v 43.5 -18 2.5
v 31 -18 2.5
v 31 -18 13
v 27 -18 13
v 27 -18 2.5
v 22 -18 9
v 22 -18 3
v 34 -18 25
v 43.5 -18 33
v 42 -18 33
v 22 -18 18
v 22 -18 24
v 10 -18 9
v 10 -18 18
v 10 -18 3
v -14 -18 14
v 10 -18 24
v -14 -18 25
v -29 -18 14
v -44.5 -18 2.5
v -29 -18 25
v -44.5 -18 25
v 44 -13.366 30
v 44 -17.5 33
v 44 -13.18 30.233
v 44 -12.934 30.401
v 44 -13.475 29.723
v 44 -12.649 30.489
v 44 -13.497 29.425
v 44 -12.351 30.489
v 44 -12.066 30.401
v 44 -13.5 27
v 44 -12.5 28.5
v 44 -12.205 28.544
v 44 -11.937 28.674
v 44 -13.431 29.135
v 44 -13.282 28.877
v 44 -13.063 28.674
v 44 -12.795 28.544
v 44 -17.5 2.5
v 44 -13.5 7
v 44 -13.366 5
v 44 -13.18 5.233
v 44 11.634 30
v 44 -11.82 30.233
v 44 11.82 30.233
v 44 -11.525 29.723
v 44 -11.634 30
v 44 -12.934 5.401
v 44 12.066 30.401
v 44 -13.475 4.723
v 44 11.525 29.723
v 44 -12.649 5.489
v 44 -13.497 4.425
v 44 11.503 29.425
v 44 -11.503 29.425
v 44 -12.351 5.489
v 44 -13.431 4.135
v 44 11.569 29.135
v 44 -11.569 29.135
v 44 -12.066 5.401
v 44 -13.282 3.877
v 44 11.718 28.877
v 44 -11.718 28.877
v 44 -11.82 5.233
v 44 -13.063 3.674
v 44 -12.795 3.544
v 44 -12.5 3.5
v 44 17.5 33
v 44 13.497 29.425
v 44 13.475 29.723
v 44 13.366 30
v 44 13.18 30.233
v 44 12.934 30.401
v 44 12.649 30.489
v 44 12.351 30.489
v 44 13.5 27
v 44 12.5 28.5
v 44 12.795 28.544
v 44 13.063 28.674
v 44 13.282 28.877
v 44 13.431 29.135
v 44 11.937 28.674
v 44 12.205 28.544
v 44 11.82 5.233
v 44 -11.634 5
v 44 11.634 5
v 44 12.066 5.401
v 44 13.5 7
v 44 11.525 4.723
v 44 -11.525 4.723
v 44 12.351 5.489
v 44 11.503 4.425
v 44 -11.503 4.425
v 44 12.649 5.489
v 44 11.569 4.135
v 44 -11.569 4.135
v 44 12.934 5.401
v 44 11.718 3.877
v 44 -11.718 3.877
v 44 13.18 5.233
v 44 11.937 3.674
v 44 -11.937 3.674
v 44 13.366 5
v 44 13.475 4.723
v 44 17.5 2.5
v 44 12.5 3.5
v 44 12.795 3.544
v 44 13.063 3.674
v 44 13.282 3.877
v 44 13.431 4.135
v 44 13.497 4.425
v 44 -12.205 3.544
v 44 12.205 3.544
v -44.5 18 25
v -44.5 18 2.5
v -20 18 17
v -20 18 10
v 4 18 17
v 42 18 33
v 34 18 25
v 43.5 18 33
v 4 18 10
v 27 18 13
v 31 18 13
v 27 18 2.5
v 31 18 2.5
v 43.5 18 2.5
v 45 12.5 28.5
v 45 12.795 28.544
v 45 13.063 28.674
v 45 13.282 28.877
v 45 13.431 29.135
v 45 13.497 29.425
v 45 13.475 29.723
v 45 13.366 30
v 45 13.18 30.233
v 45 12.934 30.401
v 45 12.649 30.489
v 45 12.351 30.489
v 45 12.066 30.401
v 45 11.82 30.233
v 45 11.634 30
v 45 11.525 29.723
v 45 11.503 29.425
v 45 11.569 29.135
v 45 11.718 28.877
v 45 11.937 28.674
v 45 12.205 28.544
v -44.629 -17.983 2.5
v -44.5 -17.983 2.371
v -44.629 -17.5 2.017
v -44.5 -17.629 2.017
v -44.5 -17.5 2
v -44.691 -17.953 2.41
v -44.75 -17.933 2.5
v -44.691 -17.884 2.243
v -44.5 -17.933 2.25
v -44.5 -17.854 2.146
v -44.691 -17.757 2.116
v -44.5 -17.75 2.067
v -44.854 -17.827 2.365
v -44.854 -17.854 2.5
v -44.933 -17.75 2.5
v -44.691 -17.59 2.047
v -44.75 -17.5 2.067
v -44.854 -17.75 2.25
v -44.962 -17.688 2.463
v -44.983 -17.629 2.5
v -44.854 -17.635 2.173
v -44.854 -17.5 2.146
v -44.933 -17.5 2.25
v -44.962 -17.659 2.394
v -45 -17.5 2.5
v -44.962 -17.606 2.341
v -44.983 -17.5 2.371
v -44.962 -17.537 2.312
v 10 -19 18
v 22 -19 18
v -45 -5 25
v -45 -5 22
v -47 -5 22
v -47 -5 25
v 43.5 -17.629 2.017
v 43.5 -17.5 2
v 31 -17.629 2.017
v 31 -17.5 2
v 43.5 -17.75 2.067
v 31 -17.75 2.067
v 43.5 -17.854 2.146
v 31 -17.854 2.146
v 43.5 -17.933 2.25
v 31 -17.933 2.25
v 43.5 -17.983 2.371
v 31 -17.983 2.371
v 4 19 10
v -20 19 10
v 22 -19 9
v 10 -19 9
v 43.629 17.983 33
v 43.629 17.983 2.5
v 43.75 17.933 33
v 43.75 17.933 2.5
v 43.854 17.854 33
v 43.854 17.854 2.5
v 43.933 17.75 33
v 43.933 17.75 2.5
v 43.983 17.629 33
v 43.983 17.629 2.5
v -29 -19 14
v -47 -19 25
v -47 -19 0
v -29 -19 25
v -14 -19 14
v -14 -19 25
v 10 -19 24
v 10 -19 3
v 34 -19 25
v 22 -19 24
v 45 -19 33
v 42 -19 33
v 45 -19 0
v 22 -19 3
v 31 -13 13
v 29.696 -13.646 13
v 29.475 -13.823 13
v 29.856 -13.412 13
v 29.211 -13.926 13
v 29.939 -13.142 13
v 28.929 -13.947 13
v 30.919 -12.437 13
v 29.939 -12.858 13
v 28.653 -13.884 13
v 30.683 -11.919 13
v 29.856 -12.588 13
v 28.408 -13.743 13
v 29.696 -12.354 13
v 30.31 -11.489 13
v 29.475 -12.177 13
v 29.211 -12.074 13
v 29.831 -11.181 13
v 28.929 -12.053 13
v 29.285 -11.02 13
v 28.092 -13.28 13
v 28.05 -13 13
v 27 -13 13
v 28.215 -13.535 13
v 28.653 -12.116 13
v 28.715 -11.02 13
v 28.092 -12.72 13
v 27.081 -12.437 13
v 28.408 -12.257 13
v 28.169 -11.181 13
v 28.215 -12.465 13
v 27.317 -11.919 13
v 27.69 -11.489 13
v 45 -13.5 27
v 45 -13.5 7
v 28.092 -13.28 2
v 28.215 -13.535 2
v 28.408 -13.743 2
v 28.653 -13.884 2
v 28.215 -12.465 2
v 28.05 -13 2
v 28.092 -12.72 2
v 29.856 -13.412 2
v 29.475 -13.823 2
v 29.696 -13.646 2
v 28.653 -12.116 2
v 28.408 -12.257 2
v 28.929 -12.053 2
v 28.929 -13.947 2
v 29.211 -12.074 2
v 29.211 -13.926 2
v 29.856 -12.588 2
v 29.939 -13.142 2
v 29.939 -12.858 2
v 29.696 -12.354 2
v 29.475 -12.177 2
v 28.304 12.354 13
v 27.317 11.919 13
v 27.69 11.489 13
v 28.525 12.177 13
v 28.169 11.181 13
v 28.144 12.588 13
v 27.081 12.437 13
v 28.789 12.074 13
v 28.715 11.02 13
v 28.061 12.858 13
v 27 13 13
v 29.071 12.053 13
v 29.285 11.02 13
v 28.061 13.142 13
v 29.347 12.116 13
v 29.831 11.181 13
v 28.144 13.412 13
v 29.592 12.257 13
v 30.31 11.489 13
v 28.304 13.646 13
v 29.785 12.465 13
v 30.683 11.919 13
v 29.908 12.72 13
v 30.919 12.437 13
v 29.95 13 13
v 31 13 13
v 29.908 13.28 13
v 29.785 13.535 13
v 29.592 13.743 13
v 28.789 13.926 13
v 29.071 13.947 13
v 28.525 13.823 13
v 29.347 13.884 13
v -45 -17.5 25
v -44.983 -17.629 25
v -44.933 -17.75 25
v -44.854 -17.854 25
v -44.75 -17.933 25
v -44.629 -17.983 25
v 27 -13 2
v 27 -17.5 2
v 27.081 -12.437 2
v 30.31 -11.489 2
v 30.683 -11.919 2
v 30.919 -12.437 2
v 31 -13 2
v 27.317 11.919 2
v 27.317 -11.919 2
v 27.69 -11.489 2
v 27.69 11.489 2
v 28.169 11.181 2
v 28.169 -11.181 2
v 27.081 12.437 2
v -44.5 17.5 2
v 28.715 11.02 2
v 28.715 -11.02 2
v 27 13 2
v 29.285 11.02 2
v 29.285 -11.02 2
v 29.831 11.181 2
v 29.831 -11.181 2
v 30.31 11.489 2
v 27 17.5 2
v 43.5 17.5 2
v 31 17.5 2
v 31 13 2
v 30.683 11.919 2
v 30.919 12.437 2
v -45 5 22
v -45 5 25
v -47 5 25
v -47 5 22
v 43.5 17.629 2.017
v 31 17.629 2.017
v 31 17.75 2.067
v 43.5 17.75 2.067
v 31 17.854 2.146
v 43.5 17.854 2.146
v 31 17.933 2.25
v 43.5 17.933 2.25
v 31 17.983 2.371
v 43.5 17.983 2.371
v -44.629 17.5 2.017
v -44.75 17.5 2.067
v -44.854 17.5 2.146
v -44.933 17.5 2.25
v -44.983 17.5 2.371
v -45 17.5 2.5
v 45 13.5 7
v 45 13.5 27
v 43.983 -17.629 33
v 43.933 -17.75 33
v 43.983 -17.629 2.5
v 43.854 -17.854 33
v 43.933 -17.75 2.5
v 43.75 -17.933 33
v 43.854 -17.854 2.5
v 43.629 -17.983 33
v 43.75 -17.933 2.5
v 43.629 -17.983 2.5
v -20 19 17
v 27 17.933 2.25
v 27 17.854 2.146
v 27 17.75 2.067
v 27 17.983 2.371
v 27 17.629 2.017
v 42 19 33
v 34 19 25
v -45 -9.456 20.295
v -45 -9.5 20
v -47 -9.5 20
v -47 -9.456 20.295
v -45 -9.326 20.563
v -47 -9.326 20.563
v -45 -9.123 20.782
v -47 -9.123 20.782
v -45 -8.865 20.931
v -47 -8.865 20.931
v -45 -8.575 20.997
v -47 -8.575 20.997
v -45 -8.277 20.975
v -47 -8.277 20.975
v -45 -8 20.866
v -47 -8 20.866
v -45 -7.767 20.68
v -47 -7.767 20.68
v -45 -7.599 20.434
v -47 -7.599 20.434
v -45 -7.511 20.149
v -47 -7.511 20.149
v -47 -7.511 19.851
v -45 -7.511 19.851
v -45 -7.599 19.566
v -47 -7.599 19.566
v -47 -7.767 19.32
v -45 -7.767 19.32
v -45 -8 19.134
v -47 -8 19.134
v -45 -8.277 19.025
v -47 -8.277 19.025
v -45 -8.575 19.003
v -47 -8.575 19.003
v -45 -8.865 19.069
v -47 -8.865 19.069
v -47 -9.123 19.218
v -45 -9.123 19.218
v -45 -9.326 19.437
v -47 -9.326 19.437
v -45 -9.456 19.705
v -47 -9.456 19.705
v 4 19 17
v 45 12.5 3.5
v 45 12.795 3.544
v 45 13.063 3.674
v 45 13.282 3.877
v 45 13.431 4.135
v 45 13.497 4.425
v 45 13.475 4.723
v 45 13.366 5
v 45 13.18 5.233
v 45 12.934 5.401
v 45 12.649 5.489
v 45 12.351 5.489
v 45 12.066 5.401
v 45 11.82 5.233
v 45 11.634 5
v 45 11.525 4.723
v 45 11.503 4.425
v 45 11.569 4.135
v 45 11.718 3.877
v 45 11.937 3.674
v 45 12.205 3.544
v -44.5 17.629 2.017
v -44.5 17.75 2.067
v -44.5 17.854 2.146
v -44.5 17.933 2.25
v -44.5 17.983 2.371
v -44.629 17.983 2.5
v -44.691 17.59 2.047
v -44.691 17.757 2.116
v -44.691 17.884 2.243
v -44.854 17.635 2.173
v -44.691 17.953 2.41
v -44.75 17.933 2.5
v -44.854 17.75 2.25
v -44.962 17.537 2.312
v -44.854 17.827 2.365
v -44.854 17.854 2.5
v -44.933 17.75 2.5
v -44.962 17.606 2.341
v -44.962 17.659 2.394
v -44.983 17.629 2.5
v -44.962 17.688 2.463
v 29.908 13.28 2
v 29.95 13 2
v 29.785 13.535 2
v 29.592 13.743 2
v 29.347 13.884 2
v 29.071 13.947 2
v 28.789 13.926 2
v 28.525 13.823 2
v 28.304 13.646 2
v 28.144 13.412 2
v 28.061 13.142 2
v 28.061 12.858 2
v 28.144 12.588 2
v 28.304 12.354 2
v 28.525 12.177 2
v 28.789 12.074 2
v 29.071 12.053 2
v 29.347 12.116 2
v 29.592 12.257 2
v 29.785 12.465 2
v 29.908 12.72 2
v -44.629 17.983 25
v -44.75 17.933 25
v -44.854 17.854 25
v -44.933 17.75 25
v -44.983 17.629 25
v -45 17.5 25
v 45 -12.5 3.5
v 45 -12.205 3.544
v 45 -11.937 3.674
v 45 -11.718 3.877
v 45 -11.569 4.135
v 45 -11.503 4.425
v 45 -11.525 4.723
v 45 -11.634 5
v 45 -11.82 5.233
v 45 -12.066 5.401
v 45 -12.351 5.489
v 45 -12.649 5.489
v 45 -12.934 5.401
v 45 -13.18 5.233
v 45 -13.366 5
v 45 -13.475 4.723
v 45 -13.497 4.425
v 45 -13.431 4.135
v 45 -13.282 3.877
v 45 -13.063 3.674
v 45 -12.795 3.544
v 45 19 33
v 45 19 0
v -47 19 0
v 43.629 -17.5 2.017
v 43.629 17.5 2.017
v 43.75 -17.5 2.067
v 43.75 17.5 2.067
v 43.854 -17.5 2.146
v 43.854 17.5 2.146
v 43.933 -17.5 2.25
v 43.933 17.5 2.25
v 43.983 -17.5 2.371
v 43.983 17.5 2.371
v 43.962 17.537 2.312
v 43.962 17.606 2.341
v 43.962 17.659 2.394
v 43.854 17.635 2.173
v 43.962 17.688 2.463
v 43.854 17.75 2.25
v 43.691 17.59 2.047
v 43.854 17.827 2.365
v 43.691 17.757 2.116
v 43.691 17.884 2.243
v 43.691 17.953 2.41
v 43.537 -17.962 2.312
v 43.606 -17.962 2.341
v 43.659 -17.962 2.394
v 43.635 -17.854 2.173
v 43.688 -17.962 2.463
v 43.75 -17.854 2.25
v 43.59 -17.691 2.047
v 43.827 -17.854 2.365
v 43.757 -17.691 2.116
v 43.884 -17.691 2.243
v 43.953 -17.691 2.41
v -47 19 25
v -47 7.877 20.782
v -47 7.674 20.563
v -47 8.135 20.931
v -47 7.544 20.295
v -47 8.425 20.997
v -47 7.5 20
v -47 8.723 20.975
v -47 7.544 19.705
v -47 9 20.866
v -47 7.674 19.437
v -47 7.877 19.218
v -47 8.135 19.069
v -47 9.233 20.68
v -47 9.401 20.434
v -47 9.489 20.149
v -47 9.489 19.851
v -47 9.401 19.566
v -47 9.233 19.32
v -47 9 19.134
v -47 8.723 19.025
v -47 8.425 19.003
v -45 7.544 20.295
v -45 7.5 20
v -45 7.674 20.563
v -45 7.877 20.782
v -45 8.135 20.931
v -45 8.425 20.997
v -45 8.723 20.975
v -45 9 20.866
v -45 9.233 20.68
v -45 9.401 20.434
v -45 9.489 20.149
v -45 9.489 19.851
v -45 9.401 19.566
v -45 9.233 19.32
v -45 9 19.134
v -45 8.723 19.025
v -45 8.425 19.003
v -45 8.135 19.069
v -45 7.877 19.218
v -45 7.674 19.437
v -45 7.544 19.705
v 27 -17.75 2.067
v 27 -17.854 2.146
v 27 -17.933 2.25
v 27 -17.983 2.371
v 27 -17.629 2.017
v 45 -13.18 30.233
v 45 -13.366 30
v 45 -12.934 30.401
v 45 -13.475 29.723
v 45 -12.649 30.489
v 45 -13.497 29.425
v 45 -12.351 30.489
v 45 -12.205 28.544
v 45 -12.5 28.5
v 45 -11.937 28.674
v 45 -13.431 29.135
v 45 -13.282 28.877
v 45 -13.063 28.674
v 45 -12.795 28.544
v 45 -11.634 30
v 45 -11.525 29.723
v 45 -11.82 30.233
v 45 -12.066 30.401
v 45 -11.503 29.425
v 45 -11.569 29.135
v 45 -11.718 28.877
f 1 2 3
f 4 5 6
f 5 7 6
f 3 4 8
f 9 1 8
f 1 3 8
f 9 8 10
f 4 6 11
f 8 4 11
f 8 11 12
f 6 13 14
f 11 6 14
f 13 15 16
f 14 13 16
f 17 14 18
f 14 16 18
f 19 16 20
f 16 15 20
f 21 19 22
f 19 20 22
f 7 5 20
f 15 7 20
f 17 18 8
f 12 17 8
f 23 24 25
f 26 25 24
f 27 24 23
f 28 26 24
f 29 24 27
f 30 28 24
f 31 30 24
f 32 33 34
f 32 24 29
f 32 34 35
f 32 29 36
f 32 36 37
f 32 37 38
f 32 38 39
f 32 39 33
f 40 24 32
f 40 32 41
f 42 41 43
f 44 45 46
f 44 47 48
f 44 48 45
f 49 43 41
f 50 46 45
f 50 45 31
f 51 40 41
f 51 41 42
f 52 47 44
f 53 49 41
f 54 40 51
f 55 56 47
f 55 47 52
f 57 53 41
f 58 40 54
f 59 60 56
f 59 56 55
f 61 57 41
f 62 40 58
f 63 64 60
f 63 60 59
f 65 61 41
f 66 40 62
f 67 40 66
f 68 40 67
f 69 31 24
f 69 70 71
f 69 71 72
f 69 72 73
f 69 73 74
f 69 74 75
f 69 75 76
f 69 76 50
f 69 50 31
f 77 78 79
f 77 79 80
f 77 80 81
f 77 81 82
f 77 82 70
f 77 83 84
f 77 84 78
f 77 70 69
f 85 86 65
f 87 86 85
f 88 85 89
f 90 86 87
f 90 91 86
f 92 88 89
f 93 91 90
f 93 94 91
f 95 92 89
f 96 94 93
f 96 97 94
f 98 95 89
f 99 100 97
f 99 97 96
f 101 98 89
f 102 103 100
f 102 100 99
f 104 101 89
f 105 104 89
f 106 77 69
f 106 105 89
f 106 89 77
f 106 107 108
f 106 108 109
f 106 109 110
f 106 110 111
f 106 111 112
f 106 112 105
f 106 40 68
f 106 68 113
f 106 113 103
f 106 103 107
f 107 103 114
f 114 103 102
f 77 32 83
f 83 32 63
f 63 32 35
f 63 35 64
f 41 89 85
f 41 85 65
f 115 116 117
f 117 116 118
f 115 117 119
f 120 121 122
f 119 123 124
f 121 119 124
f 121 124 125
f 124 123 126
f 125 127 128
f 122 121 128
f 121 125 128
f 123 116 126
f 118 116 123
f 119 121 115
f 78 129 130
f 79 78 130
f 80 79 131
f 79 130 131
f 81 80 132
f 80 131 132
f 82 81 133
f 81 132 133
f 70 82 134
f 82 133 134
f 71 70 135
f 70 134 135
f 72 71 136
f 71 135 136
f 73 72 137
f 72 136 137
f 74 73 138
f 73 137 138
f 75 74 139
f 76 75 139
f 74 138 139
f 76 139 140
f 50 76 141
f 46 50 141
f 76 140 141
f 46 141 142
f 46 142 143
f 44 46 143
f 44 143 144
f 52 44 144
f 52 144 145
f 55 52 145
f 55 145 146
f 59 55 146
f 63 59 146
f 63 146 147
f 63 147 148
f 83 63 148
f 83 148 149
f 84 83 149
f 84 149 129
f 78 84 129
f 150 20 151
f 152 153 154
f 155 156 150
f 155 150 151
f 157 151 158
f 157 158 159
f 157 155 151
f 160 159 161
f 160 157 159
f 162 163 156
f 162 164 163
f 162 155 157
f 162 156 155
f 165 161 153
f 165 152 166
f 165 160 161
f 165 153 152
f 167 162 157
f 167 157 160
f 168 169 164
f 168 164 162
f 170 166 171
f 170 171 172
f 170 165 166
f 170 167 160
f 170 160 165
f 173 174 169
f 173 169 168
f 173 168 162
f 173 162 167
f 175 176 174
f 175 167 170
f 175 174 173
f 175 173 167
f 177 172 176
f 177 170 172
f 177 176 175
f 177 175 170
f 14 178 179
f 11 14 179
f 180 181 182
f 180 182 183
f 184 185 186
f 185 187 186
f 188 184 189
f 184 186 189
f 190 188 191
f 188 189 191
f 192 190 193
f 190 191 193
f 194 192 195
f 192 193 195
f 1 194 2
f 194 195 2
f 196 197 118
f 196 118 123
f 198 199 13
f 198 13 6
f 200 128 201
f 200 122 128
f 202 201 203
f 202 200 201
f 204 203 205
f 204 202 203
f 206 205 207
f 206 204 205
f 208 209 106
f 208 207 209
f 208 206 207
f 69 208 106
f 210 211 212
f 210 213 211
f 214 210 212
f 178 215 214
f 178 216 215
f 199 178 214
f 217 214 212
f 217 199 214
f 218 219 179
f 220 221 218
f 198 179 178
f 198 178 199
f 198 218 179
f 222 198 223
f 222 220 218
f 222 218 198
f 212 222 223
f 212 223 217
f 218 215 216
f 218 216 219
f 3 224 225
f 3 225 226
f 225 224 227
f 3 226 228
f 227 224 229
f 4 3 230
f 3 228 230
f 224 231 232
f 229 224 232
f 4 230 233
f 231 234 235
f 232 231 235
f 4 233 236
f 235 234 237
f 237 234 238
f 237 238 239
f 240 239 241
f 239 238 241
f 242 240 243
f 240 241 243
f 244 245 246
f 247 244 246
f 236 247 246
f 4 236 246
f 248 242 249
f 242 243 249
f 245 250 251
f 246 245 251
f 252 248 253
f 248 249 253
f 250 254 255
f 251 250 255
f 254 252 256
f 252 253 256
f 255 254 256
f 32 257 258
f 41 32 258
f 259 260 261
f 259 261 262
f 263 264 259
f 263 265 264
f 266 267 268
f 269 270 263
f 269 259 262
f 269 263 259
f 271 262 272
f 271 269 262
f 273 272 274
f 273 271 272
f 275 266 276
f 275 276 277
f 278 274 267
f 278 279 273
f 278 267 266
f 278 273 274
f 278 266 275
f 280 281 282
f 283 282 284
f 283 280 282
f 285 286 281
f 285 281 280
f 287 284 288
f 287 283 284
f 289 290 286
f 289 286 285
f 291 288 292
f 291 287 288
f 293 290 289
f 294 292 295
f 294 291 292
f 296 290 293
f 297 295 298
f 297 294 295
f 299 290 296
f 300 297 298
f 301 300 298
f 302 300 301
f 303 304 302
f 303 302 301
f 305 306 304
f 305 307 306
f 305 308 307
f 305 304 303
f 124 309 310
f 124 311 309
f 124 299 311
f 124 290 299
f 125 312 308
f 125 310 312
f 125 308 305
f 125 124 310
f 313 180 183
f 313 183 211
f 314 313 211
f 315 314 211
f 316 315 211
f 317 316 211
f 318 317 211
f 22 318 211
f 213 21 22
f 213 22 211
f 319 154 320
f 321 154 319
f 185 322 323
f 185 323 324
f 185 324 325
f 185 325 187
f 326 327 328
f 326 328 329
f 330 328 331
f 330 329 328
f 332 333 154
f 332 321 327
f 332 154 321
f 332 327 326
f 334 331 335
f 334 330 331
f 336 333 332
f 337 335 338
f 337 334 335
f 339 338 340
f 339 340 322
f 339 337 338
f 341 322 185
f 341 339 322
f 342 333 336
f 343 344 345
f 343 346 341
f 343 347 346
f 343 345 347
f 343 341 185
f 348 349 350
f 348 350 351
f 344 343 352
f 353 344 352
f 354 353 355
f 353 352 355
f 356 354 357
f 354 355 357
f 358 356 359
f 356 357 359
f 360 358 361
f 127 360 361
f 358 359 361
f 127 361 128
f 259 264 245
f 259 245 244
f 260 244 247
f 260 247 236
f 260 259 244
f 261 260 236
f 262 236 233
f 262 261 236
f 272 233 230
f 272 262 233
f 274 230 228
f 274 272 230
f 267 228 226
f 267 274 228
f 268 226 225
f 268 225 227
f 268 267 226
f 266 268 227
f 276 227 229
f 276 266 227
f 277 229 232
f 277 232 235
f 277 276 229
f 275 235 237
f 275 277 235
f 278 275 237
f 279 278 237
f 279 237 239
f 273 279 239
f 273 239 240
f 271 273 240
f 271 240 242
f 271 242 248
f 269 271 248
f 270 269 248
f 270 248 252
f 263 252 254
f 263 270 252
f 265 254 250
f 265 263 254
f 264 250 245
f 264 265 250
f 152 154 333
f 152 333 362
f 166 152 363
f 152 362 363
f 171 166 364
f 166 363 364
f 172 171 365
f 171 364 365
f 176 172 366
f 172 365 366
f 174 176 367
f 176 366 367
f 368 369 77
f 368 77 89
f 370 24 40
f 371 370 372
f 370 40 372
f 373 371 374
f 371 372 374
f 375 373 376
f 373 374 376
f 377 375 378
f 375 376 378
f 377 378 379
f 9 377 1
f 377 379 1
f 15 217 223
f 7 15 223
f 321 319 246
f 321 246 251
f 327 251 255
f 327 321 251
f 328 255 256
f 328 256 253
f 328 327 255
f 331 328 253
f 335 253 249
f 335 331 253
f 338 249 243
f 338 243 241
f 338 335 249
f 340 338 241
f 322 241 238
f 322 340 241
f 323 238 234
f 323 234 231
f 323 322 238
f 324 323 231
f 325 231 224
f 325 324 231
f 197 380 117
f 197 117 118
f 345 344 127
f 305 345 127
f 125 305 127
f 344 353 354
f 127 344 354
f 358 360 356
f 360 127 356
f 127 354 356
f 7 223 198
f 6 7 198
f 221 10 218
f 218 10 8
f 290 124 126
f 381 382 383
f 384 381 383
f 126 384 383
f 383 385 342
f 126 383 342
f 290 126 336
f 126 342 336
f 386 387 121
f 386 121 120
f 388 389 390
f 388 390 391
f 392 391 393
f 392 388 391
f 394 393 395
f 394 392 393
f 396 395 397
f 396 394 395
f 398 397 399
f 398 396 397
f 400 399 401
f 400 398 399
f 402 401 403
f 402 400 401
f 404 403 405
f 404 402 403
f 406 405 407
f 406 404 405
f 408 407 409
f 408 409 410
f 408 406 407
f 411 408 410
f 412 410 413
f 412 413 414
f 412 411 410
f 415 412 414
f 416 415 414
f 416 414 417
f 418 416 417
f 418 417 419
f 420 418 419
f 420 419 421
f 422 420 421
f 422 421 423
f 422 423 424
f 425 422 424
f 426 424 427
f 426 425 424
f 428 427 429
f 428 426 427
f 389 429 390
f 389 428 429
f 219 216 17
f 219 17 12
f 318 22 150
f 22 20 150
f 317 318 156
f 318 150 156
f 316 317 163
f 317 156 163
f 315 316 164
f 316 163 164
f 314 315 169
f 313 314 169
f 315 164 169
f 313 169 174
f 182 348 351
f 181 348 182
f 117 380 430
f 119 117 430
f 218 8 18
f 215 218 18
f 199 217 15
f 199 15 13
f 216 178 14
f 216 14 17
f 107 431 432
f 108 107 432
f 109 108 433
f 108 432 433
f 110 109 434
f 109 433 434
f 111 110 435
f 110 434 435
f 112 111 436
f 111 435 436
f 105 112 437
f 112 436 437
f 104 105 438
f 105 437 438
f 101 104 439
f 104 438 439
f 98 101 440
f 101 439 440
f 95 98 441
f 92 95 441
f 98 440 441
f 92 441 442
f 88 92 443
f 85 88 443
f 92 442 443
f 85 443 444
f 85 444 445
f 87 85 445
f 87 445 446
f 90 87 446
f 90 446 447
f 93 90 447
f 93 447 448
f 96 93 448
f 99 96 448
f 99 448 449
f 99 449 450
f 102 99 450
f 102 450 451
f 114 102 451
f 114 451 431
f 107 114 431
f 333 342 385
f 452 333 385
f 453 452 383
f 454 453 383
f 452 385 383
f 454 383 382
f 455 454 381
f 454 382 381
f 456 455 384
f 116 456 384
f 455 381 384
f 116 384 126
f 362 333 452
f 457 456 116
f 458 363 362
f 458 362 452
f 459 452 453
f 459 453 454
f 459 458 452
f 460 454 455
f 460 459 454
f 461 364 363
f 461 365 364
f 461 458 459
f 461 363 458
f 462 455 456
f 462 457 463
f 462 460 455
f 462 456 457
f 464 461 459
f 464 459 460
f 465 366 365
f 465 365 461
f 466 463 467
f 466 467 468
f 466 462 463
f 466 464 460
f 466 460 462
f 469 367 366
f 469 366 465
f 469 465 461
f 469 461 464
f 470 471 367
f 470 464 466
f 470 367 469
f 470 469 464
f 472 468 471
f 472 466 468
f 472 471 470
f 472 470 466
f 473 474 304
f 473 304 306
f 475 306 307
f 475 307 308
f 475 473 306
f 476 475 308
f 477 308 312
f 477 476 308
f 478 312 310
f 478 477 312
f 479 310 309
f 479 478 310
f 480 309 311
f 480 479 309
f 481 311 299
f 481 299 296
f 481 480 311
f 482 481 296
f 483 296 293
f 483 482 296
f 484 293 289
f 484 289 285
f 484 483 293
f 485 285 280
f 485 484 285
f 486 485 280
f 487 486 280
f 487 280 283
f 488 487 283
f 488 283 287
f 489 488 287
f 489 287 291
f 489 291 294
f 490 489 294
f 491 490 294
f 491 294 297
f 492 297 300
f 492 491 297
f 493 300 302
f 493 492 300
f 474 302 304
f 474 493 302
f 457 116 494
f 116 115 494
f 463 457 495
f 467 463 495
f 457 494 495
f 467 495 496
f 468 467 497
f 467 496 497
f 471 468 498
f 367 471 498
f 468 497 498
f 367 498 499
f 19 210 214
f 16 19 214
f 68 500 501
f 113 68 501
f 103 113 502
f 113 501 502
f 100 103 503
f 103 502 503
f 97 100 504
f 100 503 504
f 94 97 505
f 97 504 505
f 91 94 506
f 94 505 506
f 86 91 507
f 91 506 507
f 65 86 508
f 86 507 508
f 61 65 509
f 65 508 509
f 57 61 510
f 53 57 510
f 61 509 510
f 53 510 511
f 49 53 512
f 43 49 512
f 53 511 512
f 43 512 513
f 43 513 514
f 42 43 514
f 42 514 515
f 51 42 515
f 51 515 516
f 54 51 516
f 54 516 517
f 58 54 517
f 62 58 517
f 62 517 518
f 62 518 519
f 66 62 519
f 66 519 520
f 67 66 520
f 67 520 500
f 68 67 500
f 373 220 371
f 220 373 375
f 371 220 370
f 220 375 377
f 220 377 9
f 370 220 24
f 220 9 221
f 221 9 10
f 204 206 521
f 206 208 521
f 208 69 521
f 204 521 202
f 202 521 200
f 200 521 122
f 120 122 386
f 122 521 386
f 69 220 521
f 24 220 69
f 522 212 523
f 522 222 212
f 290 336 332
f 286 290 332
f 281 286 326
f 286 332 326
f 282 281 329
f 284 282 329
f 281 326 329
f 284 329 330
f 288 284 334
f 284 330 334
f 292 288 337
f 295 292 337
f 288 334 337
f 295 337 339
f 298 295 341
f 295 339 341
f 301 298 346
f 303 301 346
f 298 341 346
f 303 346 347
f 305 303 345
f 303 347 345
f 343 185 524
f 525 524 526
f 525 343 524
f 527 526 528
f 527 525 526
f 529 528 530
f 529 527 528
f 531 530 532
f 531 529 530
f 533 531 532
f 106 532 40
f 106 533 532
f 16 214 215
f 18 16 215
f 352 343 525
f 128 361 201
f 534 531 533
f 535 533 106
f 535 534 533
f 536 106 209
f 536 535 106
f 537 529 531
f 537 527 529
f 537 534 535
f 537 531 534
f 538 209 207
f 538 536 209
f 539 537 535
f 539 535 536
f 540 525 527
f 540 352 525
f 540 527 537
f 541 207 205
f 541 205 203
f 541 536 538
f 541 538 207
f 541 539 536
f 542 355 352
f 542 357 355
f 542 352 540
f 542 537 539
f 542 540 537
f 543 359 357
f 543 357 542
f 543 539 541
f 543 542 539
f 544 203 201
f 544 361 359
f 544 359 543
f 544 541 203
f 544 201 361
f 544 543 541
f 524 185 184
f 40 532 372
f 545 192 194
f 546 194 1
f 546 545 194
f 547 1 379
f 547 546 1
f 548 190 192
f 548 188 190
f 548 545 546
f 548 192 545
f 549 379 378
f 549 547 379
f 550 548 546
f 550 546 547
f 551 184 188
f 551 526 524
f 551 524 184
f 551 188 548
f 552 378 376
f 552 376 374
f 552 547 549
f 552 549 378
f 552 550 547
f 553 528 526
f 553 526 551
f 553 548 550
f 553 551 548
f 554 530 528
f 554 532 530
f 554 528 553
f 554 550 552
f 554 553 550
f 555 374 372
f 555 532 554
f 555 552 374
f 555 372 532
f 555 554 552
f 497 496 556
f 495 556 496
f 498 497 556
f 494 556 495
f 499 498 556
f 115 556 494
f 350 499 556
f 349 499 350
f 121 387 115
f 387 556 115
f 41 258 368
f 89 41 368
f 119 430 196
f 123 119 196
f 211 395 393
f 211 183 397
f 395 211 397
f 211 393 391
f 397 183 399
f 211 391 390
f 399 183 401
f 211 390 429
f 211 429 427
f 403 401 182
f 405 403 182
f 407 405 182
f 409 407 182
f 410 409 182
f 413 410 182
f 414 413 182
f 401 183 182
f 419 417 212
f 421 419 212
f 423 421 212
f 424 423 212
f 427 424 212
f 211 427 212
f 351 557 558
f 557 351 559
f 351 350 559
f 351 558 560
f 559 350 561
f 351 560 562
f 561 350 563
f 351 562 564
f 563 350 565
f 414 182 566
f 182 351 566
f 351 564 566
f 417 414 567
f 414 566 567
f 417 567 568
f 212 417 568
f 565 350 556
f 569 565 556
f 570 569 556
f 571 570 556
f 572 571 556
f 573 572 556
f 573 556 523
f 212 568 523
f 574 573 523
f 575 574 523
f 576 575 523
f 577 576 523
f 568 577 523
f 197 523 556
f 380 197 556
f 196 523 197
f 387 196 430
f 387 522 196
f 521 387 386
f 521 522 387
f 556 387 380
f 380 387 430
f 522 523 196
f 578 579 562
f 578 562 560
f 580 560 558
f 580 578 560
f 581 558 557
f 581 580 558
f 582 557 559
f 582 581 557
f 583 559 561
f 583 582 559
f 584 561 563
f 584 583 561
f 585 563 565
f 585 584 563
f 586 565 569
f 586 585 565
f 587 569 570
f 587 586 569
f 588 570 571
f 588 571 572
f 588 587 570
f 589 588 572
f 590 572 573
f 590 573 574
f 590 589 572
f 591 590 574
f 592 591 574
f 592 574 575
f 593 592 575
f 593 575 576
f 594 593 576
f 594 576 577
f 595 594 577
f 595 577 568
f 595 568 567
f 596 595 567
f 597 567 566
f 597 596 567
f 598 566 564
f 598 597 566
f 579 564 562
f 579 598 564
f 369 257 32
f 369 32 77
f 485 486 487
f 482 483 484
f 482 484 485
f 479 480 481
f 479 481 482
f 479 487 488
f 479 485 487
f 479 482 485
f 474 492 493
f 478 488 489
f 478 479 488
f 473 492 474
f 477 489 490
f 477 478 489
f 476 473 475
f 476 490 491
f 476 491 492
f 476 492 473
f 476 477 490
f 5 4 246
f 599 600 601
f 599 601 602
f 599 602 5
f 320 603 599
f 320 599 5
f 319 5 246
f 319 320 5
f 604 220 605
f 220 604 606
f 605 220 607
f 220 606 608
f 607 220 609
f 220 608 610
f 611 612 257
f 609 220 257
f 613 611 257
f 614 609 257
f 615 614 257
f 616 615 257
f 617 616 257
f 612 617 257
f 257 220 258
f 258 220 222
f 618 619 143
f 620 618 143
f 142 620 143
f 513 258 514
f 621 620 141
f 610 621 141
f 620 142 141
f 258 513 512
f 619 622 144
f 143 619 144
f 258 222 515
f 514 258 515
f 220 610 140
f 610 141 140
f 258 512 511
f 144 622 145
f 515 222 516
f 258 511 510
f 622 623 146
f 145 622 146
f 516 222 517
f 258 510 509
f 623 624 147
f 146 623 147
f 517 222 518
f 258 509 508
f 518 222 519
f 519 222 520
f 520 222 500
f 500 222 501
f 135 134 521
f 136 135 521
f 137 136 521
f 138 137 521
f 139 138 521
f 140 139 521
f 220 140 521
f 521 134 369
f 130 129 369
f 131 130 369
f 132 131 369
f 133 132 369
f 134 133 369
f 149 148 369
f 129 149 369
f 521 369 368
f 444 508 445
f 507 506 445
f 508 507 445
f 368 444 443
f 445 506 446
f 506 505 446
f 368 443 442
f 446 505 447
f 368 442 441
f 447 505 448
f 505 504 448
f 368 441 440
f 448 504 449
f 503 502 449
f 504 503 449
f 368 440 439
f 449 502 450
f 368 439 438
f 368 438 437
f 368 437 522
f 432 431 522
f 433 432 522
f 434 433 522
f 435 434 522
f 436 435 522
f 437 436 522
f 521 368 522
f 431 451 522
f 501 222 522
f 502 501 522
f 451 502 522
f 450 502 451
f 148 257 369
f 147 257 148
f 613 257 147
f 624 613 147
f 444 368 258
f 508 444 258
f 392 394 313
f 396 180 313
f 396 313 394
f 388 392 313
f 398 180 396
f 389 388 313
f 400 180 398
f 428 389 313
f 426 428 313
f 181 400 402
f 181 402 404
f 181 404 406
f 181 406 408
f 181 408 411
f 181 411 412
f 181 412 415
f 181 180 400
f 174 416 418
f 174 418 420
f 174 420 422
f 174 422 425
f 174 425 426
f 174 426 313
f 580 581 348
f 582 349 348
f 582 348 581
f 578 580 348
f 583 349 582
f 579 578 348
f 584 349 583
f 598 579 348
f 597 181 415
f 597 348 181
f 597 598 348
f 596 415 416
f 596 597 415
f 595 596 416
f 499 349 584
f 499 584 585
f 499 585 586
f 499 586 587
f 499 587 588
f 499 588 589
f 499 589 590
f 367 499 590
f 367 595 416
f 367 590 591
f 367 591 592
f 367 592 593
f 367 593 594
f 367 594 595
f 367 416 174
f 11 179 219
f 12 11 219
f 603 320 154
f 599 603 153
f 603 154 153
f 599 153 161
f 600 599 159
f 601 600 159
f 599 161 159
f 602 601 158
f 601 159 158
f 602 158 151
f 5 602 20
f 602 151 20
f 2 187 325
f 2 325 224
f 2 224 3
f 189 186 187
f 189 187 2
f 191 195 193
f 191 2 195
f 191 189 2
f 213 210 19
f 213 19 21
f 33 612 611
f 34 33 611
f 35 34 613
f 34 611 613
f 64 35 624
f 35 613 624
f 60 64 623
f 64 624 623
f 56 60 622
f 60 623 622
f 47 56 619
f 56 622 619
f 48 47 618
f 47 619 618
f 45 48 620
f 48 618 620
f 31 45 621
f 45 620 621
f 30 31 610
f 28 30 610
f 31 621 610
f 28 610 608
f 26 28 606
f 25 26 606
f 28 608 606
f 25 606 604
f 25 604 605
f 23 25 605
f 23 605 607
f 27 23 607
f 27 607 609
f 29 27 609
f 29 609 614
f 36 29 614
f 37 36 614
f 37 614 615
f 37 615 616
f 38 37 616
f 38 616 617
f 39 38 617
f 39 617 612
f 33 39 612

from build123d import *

# Parameters (mm, degrees)
SKETCH_1_W          = 90
SKETCH_1_H          = 38
EXTRUDE_1_DEPTH     = 2
EXTRUDE_2_DEPTH     = 23
CUT_EXTRUDE_1_REACH = 65.984
SKETCH_3_W          = 12
SKETCH_3_H          = 6
SKETCH_3_W_2        = 15
SKETCH_3_H_2        = 11
CUT_EXTRUDE_2_REACH = 65.984
SKETCH_4_W          = 24
SKETCH_4_H          = 7
SKETCH_7_W          = 1
SKETCH_7_H          = 38
EXTRUDE_3_DEPTH     = 8
CUT_EXTRUDE_3_REACH = 99.724
SKETCH_6_W          = 20
SKETCH_6_H          = 27
CUT_EXTRUDE_4_REACH = 99.724
SKETCH_8_R          = 1
CHAMFER_1_SIZE      = 10
FILLET_1_R          = 0.5
SKETCH_10_R         = 0.95
EXTRUDE_4_DEPTH     = 11
SKETCH_11_R         = 1
EXTRUDE_5_DEPTH     = 2
FILLET_2_R          = 0.5


with BuildPart() as part:
    # 草图1 → 凸台-拉伸1 (new body)
    with BuildSketch(Plane.XY):
        Rectangle(SKETCH_1_W, SKETCH_1_H)
    extrude(amount=EXTRUDE_1_DEPTH)

    # 草图2 → 凸台-拉伸2 (add)
    with BuildSketch(Plane.XY.offset(2)):
        Polygon((44, 18), (-44, 18), (-45, 18), (-45, 19), (45, 19), (45, -19), (-45, -19), (-45, -18), (-44, -18), (44, -18), align=None)
    extrude(amount=EXTRUDE_2_DEPTH)

    # 草图3 → 切除-拉伸1 (cut, up to next)
    with BuildSketch(Plane.XZ.offset(19), mode=Mode.PRIVATE) as cut_extrude_1_sk1:
        with Locations((16, 6)):
            Rectangle(SKETCH_3_W, SKETCH_3_H)
    cut_extrude_1_tool1 = extrude(cut_extrude_1_sk1.sketch, amount=-CUT_EXTRUDE_1_REACH, mode=Mode.PRIVATE) & part.part
    # 草图3 → 切除-拉伸1 (cut, up to next)
    with BuildSketch(Plane.XZ.offset(19), mode=Mode.PRIVATE) as cut_extrude_1_sk2:
        with Locations((16, 21)):
            Rectangle(SKETCH_3_W, SKETCH_3_H)
    cut_extrude_1_tool2 = extrude(cut_extrude_1_sk2.sketch, amount=-CUT_EXTRUDE_1_REACH, mode=Mode.PRIVATE) & part.part
    # 草图3 → 切除-拉伸1 (cut, up to next)
    with BuildSketch(Plane.XZ.offset(19), mode=Mode.PRIVATE) as cut_extrude_1_sk3:
        with Locations((-21.5, 19.5)):
            Rectangle(SKETCH_3_W_2, SKETCH_3_H_2)
    cut_extrude_1_tool3 = extrude(cut_extrude_1_sk3.sketch, amount=-CUT_EXTRUDE_1_REACH, mode=Mode.PRIVATE) & part.part
    add(cut_extrude_1_tool1.solids().sort_by_distance((16, -19, 6))[0], mode=Mode.SUBTRACT)
    add(cut_extrude_1_tool2.solids().sort_by_distance((16, -19, 21))[0], mode=Mode.SUBTRACT)
    add(cut_extrude_1_tool3.solids().sort_by_distance((-21.5, -19, 19.5))[0], mode=Mode.SUBTRACT)

    # 草图4 → 切除-拉伸2 (cut, up to next)
    with BuildSketch(Plane(origin=(0, 19, 0), x_dir=(1, 0, 0), z_dir=(0, 1, 0)), mode=Mode.PRIVATE) as cut_extrude_2_sk1:
        with Locations((-8, -13.5)):
            Rectangle(SKETCH_4_W, SKETCH_4_H)
    cut_extrude_2_tool1 = extrude(cut_extrude_2_sk1.sketch, amount=-CUT_EXTRUDE_2_REACH, mode=Mode.PRIVATE) & part.part
    add(cut_extrude_2_tool1.solids().sort_by_distance((-8, 19, 13.5))[0], mode=Mode.SUBTRACT)

    # 草图7 → 凸台-拉伸3 (add)
    with BuildSketch(Plane.XY.offset(25)):
        with Locations((44.5, 0)):
            Rectangle(SKETCH_7_W, SKETCH_7_H)
    extrude(amount=EXTRUDE_3_DEPTH)

    # 草图6 → 切除-拉伸3 (cut, up to next)
    with BuildSketch(Plane(origin=(45, 0, 0), x_dir=(0, 0, -1), z_dir=(1, 0, 0)), mode=Mode.PRIVATE) as cut_extrude_3_sk1:
        with Locations((-17, 0)):
            Rectangle(SKETCH_6_W, SKETCH_6_H)
    cut_extrude_3_tool1 = extrude(cut_extrude_3_sk1.sketch, amount=-CUT_EXTRUDE_3_REACH, mode=Mode.PRIVATE) & part.part
    add(cut_extrude_3_tool1.solids().sort_by_distance((45, 0, 17))[0], mode=Mode.SUBTRACT)

    # 草图8 → 切除-拉伸4 (cut, up to next)
    with BuildSketch(Plane(origin=(45, 0, 0), x_dir=(0, 0, -1), z_dir=(1, 0, 0)), mode=Mode.PRIVATE) as cut_extrude_4_sk1:
        with Locations((-29.5, 12.5)):
            Circle(SKETCH_8_R)
    cut_extrude_4_tool1 = extrude(cut_extrude_4_sk1.sketch, amount=-CUT_EXTRUDE_4_REACH, mode=Mode.PRIVATE) & part.part
    # 草图8 → 切除-拉伸4 (cut, up to next)
    with BuildSketch(Plane(origin=(45, 0, 0), x_dir=(0, 0, -1), z_dir=(1, 0, 0)), mode=Mode.PRIVATE) as cut_extrude_4_sk2:
        with Locations((-29.5, -12.5)):
            Circle(SKETCH_8_R)
    cut_extrude_4_tool2 = extrude(cut_extrude_4_sk2.sketch, amount=-CUT_EXTRUDE_4_REACH, mode=Mode.PRIVATE) & part.part
    # 草图8 → 切除-拉伸4 (cut, up to next)
    with BuildSketch(Plane(origin=(45, 0, 0), x_dir=(0, 0, -1), z_dir=(1, 0, 0)), mode=Mode.PRIVATE) as cut_extrude_4_sk3:
        with Locations((-4.5, -12.5)):
            Circle(SKETCH_8_R)
    cut_extrude_4_tool3 = extrude(cut_extrude_4_sk3.sketch, amount=-CUT_EXTRUDE_4_REACH, mode=Mode.PRIVATE) & part.part
    # 草图8 → 切除-拉伸4 (cut, up to next)
    with BuildSketch(Plane(origin=(45, 0, 0), x_dir=(0, 0, -1), z_dir=(1, 0, 0)), mode=Mode.PRIVATE) as cut_extrude_4_sk4:
        with Locations((-4.5, 12.5)):
            Circle(SKETCH_8_R)
    cut_extrude_4_tool4 = extrude(cut_extrude_4_sk4.sketch, amount=-CUT_EXTRUDE_4_REACH, mode=Mode.PRIVATE) & part.part
    add(cut_extrude_4_tool1.solids().sort_by_distance((45, 12.5, 29.5))[0], mode=Mode.SUBTRACT)
    add(cut_extrude_4_tool2.solids().sort_by_distance((45, -12.5, 29.5))[0], mode=Mode.SUBTRACT)
    add(cut_extrude_4_tool3.solids().sort_by_distance((45, -12.5, 4.5))[0], mode=Mode.SUBTRACT)
    add(cut_extrude_4_tool4.solids().sort_by_distance((45, 12.5, 4.5))[0], mode=Mode.SUBTRACT)

    # 倒角1
    # the kernel refuses this chamfer: 10 mm, written as the material it adds along each edge
    with BuildSketch(Plane(origin=(44, 19, 25), x_dir=(-0.9996219169112968, 0, -0.027495876610586317), z_dir=(0, -1, 0))) as chamfer_1_piece_1_section:
        Polygon((CHAMFER_1_SIZE * 0.999621916911, -CHAMFER_1_SIZE * 0.0274958766106), (-CHAMFER_1_SIZE * 0.0274958766106, -CHAMFER_1_SIZE * 0.999621916911), (0, 0), align=None)
    chamfer_1_piece_1 = extrude(amount=1, mode=Mode.PRIVATE)
    chamfer_1_piece_1 = split(chamfer_1_piece_1, bisect_by=Plane(origin=(39.481481481, 18.5, 33), z_dir=(0, 0, -1)), keep=Keep.TOP, mode=Mode.PRIVATE)
    add(chamfer_1_piece_1)
    with BuildSketch(Plane(origin=(44, -18, 25), x_dir=(0.027495876610586317, 0, 0.9996219169112968), z_dir=(0, -1, 0))) as chamfer_1_piece_2_section:
        Polygon((CHAMFER_1_SIZE * 0.999621916911, CHAMFER_1_SIZE * 0.0274958766106), (-CHAMFER_1_SIZE * 0.0274958766106, CHAMFER_1_SIZE * 0.999621916911), (0, 0), align=None)
    chamfer_1_piece_2 = extrude(amount=1, mode=Mode.PRIVATE)
    chamfer_1_piece_2 = split(chamfer_1_piece_2, bisect_by=Plane(origin=(41.2, -18.5, 33), z_dir=(0, 0, -1)), keep=Keep.TOP, mode=Mode.PRIVATE)
    add(chamfer_1_piece_2)

    # 圆角1
    fillet_1_edges = [part.edges().sort_by_distance(p)[0] for p in [
        (-0.5, 18, 2),
        (44, 0, 2),
        (44, 18, 17.5),
        (-0.5, -18, 2),
        (44, -18, 17.5),
    ]]
    fillet(fillet_1_edges, radius=FILLET_1_R)

    # 草图10 → 凸台-拉伸4 (add)
    # profile 1 of 2: a face of its own
    with BuildSketch(Plane.XY.offset(2)):
        with BuildLine():
            Line((31, 13), (31, 18))
            Line((31, 18), (27, 18))
            Line((27, 18), (27, 13))
            ThreePointArc((27, 13), (29, 11), (31, 13))
        make_face()
        with Locations((29, 13)):
            Circle(SKETCH_10_R, mode=Mode.SUBTRACT)
    # profile 2 of 2: a face of its own
    with BuildSketch(Plane.XY.offset(2)):
        with BuildLine():
            Line((31, -13), (31, -18))
            Line((31, -18), (27, -18))
            Line((27, -18), (27, -13))
            ThreePointArc((27, -13), (29, -11), (31, -13))
        make_face()
        with Locations(Location((29, -13, 0), (0, 0, 180))):
            Circle(SKETCH_10_R, mode=Mode.SUBTRACT)
    extrude(amount=EXTRUDE_4_DEPTH)

    # 草图11 → 凸台-拉伸5 (add)
    with BuildSketch(Plane.ZY.offset(45)):
        Polygon((0, 19), (25, 19), (25, 5), (22, 5), (22, -5), (25, -5), (25, -19), (0, -19), align=None)
        with Locations(Location((20, 8.5, 0), (0, 0, 270))):
            Circle(SKETCH_11_R, mode=Mode.SUBTRACT)
        with Locations(Location((20, -8.5, 0), (0, 0, 270))):
            Circle(SKETCH_11_R, mode=Mode.SUBTRACT)
    extrude(amount=EXTRUDE_5_DEPTH)

    # 圆角2
    fillet_2_edges = [part.edges().sort_by_distance(p)[0] for p in [
        (-45, 18, 13.75),
        (-45, 0, 2),
        (-45, -17.853553391, 2.146446609),
        (-45, 17.853553391, 2.146446609),
        (-45, -18, 13.75),
    ]]
    fillet(fillet_2_edges, radius=FILLET_2_R)


solid = part.part
